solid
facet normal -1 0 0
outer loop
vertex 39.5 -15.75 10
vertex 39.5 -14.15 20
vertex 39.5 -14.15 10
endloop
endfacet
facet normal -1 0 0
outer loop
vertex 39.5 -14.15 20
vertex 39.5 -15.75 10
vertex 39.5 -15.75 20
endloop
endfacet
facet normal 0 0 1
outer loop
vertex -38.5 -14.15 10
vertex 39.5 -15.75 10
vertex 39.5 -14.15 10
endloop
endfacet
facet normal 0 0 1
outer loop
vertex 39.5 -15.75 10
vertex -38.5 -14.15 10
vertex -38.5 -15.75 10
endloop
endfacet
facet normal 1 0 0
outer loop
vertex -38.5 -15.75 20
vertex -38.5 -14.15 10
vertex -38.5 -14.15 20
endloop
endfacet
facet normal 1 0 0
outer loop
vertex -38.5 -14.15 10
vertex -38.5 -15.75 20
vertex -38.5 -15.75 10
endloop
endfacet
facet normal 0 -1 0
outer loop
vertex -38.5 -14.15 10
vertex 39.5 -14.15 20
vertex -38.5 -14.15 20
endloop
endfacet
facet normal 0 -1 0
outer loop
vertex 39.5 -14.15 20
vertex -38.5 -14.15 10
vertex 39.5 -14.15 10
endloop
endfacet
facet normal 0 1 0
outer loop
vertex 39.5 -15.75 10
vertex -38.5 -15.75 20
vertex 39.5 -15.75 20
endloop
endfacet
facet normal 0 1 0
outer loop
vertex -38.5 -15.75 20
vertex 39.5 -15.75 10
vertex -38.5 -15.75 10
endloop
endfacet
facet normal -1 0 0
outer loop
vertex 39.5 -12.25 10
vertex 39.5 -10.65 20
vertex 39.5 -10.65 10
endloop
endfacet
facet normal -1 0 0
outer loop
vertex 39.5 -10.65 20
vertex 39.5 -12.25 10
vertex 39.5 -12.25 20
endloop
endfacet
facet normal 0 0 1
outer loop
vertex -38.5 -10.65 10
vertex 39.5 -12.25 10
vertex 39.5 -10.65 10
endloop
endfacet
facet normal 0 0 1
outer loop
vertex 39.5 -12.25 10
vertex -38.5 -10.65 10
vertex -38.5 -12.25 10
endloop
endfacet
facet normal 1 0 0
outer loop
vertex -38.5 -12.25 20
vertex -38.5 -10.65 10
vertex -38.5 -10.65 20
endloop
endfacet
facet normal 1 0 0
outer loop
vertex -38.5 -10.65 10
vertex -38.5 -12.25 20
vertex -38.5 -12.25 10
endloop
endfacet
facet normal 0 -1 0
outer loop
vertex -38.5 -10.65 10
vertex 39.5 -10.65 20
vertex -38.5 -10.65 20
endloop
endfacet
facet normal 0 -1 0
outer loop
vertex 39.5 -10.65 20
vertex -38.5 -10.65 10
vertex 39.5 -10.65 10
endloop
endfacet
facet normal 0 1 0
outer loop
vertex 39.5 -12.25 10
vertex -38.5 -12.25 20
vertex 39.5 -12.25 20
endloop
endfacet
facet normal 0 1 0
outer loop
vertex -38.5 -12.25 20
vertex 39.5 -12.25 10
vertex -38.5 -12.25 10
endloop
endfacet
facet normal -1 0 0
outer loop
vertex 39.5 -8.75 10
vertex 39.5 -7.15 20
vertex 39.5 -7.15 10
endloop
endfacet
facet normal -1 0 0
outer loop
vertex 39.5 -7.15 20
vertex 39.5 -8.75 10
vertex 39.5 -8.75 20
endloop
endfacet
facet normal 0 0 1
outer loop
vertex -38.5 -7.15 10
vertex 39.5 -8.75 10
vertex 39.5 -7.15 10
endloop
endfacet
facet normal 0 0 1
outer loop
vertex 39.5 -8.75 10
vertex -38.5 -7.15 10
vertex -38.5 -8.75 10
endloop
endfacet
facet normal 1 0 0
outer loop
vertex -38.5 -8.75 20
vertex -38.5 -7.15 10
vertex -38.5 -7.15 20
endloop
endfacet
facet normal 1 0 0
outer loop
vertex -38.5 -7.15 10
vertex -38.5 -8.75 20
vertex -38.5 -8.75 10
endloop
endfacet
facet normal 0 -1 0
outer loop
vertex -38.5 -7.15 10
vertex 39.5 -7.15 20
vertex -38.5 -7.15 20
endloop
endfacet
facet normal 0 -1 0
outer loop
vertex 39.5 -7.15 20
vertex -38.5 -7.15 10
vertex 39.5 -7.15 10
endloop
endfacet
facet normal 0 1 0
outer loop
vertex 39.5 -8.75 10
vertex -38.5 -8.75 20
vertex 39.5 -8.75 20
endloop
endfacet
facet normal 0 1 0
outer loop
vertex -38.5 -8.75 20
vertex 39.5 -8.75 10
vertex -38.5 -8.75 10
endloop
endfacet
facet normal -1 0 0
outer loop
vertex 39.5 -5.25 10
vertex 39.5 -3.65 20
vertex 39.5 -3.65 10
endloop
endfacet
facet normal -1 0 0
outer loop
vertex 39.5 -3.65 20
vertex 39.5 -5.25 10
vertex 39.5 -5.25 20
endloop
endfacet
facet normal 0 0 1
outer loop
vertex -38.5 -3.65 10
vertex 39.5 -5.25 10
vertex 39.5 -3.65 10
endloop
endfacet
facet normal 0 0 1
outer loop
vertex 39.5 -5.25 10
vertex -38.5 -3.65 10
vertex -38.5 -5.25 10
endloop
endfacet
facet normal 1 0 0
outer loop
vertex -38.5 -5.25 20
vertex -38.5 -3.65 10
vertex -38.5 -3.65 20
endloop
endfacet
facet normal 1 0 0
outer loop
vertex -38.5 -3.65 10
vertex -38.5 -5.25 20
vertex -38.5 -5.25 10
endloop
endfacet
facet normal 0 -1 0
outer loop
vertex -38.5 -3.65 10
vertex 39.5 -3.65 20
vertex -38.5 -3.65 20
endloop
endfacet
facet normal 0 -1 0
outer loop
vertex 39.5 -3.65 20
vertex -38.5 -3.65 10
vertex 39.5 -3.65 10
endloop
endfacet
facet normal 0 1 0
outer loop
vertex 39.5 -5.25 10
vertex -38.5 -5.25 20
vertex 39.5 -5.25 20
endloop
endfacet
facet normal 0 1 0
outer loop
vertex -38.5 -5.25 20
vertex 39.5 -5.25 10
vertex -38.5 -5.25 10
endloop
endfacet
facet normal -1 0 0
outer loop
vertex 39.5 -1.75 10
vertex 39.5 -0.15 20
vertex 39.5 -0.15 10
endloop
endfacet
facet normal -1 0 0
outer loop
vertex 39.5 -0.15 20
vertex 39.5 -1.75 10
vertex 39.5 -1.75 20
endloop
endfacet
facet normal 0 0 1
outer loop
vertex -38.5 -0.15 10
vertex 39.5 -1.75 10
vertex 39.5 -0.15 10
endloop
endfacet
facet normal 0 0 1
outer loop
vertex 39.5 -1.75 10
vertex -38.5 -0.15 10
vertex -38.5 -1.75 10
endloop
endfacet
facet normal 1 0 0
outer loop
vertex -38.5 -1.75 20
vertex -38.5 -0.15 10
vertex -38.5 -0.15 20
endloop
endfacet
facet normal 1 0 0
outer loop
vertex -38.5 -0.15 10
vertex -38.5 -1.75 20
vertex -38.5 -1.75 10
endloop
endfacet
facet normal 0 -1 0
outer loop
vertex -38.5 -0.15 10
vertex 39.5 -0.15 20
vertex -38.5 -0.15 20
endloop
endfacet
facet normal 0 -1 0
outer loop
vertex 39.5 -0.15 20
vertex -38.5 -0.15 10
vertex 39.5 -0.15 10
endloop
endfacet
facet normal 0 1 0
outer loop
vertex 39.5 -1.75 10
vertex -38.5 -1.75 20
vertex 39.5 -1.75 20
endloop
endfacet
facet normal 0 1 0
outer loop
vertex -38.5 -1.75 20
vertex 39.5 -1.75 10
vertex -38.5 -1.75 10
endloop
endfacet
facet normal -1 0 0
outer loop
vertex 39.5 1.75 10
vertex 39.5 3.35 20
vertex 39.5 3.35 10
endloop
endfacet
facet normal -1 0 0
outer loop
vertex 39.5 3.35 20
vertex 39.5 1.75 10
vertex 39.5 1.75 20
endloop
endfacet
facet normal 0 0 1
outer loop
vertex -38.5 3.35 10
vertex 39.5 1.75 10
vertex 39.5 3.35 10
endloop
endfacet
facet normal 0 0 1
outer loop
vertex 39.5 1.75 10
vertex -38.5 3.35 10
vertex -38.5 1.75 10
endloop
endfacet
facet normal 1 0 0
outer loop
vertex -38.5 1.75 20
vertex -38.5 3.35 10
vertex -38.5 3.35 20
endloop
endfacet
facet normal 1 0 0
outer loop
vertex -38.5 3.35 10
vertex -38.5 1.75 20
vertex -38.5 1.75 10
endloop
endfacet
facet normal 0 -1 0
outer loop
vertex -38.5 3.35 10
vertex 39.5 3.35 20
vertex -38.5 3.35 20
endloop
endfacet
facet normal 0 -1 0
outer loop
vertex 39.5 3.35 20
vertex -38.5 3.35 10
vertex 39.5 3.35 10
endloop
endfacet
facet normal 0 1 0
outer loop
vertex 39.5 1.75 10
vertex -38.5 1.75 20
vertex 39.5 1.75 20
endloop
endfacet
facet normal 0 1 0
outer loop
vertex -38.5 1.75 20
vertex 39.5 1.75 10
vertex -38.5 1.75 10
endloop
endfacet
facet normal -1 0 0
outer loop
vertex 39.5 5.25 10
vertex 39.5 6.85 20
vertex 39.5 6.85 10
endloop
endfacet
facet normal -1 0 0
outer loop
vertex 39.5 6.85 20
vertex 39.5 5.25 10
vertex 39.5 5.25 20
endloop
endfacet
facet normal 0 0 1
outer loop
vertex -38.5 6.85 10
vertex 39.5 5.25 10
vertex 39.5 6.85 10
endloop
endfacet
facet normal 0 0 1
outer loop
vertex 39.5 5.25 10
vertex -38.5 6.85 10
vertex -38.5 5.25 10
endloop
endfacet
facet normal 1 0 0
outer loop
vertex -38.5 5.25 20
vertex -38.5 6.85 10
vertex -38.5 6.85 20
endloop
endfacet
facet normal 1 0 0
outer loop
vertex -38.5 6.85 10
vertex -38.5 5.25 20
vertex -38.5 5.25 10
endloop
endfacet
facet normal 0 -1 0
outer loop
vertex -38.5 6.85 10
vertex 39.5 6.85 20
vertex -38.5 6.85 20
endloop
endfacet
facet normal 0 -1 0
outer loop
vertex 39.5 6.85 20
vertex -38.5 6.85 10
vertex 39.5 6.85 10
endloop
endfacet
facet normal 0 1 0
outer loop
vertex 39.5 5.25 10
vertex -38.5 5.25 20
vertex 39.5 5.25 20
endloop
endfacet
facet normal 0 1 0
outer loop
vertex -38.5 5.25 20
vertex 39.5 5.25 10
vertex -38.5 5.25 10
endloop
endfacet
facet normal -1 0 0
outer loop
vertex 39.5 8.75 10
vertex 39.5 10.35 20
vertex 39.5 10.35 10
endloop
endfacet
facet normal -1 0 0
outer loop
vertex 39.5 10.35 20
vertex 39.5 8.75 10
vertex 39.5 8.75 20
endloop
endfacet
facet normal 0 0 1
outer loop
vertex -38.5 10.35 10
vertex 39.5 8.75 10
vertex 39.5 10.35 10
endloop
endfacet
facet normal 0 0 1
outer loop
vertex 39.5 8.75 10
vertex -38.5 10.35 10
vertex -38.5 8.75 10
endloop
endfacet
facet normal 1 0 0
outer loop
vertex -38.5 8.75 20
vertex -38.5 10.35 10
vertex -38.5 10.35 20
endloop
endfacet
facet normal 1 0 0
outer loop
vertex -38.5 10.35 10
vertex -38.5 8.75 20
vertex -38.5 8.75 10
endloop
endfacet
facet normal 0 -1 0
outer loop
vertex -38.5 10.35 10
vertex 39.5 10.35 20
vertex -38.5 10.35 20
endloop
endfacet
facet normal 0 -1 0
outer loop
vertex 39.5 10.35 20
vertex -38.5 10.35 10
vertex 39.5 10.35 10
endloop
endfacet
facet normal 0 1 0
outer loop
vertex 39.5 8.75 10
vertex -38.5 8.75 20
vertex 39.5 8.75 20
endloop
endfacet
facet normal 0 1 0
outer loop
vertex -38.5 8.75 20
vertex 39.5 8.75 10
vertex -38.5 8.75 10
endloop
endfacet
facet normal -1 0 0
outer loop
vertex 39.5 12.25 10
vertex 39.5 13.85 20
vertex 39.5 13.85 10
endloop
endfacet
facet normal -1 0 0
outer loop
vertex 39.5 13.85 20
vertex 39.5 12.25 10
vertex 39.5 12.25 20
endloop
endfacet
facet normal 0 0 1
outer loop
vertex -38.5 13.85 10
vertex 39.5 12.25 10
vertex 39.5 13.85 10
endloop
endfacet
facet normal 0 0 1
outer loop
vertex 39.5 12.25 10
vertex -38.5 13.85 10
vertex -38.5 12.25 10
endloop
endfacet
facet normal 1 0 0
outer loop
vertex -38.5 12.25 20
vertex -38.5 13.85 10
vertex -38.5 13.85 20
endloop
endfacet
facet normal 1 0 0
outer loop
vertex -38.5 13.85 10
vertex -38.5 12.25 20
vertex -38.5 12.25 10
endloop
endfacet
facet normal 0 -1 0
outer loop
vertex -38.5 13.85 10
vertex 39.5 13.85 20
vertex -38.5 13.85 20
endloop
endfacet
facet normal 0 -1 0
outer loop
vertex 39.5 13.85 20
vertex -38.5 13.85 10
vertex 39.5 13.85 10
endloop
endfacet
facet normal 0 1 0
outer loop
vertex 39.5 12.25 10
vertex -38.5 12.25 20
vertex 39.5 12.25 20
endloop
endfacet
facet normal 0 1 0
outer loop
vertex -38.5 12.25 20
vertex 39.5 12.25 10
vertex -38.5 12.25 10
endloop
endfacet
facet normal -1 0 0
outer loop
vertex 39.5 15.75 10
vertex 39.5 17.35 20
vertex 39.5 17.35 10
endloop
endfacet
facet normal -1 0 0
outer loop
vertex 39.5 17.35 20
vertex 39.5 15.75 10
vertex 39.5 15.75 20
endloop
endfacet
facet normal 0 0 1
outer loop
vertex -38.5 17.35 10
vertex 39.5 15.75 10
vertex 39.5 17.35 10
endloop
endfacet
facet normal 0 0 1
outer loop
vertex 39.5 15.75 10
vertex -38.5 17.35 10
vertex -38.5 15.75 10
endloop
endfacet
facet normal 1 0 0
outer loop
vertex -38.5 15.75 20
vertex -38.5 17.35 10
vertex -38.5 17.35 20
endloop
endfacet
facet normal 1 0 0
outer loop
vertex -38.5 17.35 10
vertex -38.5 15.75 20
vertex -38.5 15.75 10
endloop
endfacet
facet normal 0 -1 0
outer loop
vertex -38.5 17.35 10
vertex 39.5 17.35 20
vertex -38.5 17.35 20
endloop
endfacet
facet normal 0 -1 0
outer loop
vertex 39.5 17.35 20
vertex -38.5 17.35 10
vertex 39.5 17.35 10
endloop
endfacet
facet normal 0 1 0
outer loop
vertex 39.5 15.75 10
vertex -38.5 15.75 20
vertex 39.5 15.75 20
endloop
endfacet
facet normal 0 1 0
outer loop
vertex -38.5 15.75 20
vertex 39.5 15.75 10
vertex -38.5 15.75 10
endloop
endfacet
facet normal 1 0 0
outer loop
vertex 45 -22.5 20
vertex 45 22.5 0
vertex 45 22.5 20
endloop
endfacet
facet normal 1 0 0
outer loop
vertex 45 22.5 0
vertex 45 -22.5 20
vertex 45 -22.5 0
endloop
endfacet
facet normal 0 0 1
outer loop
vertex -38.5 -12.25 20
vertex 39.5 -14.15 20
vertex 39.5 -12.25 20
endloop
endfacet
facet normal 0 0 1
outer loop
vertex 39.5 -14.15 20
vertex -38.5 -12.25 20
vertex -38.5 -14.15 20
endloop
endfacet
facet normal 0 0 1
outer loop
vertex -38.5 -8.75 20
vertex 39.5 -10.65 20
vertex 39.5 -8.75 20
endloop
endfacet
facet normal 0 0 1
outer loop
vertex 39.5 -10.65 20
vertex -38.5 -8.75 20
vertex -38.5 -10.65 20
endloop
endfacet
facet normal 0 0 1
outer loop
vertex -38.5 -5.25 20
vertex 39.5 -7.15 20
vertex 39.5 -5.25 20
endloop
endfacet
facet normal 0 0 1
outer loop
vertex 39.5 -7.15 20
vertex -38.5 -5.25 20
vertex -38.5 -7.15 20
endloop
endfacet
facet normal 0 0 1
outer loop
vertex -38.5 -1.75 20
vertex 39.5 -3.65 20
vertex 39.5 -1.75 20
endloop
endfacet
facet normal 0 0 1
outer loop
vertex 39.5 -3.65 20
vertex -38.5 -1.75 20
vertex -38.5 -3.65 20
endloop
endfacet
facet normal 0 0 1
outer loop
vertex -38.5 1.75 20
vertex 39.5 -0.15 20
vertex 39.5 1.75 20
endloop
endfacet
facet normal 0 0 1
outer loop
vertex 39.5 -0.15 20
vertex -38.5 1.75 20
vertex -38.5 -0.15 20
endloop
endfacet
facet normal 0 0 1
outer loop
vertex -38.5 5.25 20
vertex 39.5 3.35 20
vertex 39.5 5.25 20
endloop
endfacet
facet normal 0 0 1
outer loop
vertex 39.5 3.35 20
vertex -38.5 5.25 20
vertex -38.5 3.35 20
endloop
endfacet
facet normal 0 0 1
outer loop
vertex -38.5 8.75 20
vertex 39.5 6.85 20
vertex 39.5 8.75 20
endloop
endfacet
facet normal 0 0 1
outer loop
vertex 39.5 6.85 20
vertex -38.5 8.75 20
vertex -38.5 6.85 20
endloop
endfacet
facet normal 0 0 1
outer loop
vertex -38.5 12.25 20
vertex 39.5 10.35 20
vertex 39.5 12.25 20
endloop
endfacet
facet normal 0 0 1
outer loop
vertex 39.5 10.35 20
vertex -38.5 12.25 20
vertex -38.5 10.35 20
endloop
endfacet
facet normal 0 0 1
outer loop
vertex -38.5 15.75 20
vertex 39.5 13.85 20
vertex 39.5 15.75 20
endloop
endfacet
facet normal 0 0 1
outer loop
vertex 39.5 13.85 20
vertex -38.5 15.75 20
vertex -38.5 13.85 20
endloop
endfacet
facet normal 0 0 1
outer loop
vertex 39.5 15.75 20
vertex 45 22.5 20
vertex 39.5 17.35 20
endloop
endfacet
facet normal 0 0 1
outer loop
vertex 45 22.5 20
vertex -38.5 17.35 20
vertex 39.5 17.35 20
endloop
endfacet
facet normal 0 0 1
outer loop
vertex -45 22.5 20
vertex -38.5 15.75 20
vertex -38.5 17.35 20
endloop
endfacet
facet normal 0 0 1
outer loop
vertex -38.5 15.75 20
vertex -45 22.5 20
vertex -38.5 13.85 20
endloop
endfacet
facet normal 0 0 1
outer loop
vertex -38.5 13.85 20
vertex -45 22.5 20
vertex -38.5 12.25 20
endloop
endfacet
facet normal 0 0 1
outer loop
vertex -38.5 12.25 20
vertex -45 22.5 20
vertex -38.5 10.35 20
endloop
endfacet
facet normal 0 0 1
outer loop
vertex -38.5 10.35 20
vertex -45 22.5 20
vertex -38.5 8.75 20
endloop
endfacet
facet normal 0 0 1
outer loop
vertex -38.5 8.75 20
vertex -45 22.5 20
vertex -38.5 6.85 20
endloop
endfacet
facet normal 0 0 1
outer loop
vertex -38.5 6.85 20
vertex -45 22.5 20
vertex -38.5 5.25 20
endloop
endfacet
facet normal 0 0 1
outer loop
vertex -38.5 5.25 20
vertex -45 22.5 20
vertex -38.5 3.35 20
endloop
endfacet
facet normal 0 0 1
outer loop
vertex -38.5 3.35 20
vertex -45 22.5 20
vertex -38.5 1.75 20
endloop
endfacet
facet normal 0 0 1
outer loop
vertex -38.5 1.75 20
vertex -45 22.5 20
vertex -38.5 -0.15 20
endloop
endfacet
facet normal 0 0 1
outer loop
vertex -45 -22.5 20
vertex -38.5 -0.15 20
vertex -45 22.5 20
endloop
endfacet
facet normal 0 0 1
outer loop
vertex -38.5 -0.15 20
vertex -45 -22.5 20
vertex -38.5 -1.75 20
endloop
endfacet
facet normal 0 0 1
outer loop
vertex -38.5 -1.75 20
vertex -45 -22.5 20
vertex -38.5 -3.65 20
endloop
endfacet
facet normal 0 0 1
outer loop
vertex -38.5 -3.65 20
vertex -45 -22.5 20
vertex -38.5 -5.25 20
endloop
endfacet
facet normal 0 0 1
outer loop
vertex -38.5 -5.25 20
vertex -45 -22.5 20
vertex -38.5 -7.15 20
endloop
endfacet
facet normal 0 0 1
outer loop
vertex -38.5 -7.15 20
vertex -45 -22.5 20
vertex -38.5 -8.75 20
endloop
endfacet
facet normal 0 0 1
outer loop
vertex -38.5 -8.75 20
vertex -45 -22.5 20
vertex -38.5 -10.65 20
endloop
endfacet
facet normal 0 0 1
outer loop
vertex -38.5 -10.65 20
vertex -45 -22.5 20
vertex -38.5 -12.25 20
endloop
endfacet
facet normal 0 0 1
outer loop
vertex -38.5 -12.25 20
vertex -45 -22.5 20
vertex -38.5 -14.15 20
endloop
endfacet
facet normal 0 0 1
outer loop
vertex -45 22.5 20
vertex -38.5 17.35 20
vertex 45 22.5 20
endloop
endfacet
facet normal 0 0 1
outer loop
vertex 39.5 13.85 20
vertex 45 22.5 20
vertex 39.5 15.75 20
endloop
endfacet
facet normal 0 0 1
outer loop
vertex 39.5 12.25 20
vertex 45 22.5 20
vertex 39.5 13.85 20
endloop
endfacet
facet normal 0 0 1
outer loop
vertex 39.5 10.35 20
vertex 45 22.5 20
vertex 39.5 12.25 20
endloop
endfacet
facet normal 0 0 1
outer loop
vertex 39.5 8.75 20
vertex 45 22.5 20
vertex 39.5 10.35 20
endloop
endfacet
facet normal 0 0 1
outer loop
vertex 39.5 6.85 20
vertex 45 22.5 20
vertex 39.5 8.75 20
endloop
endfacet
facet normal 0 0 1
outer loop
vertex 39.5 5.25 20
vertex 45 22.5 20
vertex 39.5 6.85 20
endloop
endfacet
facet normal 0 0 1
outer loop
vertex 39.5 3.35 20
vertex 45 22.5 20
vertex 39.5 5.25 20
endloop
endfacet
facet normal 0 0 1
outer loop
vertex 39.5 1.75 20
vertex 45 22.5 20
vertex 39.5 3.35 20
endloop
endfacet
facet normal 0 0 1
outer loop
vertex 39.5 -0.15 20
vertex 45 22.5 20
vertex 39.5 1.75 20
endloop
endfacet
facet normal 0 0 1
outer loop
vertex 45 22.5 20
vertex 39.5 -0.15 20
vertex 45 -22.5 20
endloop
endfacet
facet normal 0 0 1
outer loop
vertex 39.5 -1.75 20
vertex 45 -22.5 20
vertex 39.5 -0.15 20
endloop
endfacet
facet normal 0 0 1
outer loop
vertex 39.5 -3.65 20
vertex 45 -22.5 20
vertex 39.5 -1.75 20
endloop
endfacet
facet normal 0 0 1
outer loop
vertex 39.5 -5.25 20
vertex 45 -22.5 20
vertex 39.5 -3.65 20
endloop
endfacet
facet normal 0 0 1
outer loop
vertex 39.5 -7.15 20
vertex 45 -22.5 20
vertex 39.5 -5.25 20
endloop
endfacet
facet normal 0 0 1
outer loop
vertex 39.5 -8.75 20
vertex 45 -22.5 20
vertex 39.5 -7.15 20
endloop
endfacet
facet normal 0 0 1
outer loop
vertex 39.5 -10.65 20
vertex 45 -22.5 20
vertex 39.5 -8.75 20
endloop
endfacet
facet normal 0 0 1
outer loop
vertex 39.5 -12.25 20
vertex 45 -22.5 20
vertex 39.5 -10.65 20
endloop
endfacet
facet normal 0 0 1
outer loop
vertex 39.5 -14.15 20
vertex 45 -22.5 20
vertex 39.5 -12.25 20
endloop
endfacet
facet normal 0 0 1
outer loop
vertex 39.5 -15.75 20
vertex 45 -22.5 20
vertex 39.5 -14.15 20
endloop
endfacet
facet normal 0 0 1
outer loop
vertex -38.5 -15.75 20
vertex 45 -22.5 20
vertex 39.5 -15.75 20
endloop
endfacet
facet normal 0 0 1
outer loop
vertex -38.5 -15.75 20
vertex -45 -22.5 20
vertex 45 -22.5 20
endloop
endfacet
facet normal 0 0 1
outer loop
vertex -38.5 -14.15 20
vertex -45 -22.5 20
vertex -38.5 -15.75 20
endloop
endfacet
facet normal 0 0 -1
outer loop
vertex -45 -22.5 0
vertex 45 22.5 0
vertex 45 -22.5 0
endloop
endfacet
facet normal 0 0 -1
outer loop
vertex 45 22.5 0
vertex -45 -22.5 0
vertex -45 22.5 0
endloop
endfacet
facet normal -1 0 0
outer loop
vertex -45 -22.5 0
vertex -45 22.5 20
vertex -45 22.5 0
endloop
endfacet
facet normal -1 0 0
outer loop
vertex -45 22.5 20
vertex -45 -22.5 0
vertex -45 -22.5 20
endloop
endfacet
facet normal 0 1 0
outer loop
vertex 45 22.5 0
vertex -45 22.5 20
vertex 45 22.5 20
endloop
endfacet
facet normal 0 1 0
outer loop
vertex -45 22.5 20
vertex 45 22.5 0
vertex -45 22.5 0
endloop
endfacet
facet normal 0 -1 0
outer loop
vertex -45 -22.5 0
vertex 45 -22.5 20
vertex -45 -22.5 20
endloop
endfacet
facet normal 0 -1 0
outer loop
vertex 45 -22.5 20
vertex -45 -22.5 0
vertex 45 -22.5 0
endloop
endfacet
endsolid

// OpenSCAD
// Slide drying rack - holds 10 microscope slides standing upright on their long edge
// Units: mm. Print orientation: base on XY plane, slots open upward (+Z).

// ---------------- Parameters ----------------
block_len    = 90;     // block length along X
block_wid    = 45;     // block width along Y
block_h      = 20;     // block height along Z

slot_count   = 10;     // number of slide slots
slot_len     = 77;     // slot length along X (slide length + clearance)
slot_w       = 1.6;    // slot width along Y
slot_depth   = 10;     // slot depth from top face along Z
slot_pitch   = 3.5;    // centre-to-centre spacing of slots along Y

eps          = 0.5;    // overshoot so cutters pass cleanly through faces
$fn          = 64;

// ---------------- Derived ----------------
slot_x0 = -(slot_len / 2);              // first slot centre X
// First slot centre Y so the whole group is centred on the block
slot_y0 = -(slot_count - 1) * slot_pitch / 2;

// ---------------- Model ----------------
difference() {
    // Solid base block, centred in X and Y, resting on z = 0
    translate([-block_len / 2, -block_wid / 2, 0])
        cube([block_len, block_wid, block_h]);

    // Parallel slots running along X, open at the top
    for (i = [0 : slot_count - 1])
        translate([slot_x0, slot_y0 + i * slot_pitch, block_h - slot_depth])
            cube([slot_len + 2 * eps, slot_w, slot_depth + eps]);
}
